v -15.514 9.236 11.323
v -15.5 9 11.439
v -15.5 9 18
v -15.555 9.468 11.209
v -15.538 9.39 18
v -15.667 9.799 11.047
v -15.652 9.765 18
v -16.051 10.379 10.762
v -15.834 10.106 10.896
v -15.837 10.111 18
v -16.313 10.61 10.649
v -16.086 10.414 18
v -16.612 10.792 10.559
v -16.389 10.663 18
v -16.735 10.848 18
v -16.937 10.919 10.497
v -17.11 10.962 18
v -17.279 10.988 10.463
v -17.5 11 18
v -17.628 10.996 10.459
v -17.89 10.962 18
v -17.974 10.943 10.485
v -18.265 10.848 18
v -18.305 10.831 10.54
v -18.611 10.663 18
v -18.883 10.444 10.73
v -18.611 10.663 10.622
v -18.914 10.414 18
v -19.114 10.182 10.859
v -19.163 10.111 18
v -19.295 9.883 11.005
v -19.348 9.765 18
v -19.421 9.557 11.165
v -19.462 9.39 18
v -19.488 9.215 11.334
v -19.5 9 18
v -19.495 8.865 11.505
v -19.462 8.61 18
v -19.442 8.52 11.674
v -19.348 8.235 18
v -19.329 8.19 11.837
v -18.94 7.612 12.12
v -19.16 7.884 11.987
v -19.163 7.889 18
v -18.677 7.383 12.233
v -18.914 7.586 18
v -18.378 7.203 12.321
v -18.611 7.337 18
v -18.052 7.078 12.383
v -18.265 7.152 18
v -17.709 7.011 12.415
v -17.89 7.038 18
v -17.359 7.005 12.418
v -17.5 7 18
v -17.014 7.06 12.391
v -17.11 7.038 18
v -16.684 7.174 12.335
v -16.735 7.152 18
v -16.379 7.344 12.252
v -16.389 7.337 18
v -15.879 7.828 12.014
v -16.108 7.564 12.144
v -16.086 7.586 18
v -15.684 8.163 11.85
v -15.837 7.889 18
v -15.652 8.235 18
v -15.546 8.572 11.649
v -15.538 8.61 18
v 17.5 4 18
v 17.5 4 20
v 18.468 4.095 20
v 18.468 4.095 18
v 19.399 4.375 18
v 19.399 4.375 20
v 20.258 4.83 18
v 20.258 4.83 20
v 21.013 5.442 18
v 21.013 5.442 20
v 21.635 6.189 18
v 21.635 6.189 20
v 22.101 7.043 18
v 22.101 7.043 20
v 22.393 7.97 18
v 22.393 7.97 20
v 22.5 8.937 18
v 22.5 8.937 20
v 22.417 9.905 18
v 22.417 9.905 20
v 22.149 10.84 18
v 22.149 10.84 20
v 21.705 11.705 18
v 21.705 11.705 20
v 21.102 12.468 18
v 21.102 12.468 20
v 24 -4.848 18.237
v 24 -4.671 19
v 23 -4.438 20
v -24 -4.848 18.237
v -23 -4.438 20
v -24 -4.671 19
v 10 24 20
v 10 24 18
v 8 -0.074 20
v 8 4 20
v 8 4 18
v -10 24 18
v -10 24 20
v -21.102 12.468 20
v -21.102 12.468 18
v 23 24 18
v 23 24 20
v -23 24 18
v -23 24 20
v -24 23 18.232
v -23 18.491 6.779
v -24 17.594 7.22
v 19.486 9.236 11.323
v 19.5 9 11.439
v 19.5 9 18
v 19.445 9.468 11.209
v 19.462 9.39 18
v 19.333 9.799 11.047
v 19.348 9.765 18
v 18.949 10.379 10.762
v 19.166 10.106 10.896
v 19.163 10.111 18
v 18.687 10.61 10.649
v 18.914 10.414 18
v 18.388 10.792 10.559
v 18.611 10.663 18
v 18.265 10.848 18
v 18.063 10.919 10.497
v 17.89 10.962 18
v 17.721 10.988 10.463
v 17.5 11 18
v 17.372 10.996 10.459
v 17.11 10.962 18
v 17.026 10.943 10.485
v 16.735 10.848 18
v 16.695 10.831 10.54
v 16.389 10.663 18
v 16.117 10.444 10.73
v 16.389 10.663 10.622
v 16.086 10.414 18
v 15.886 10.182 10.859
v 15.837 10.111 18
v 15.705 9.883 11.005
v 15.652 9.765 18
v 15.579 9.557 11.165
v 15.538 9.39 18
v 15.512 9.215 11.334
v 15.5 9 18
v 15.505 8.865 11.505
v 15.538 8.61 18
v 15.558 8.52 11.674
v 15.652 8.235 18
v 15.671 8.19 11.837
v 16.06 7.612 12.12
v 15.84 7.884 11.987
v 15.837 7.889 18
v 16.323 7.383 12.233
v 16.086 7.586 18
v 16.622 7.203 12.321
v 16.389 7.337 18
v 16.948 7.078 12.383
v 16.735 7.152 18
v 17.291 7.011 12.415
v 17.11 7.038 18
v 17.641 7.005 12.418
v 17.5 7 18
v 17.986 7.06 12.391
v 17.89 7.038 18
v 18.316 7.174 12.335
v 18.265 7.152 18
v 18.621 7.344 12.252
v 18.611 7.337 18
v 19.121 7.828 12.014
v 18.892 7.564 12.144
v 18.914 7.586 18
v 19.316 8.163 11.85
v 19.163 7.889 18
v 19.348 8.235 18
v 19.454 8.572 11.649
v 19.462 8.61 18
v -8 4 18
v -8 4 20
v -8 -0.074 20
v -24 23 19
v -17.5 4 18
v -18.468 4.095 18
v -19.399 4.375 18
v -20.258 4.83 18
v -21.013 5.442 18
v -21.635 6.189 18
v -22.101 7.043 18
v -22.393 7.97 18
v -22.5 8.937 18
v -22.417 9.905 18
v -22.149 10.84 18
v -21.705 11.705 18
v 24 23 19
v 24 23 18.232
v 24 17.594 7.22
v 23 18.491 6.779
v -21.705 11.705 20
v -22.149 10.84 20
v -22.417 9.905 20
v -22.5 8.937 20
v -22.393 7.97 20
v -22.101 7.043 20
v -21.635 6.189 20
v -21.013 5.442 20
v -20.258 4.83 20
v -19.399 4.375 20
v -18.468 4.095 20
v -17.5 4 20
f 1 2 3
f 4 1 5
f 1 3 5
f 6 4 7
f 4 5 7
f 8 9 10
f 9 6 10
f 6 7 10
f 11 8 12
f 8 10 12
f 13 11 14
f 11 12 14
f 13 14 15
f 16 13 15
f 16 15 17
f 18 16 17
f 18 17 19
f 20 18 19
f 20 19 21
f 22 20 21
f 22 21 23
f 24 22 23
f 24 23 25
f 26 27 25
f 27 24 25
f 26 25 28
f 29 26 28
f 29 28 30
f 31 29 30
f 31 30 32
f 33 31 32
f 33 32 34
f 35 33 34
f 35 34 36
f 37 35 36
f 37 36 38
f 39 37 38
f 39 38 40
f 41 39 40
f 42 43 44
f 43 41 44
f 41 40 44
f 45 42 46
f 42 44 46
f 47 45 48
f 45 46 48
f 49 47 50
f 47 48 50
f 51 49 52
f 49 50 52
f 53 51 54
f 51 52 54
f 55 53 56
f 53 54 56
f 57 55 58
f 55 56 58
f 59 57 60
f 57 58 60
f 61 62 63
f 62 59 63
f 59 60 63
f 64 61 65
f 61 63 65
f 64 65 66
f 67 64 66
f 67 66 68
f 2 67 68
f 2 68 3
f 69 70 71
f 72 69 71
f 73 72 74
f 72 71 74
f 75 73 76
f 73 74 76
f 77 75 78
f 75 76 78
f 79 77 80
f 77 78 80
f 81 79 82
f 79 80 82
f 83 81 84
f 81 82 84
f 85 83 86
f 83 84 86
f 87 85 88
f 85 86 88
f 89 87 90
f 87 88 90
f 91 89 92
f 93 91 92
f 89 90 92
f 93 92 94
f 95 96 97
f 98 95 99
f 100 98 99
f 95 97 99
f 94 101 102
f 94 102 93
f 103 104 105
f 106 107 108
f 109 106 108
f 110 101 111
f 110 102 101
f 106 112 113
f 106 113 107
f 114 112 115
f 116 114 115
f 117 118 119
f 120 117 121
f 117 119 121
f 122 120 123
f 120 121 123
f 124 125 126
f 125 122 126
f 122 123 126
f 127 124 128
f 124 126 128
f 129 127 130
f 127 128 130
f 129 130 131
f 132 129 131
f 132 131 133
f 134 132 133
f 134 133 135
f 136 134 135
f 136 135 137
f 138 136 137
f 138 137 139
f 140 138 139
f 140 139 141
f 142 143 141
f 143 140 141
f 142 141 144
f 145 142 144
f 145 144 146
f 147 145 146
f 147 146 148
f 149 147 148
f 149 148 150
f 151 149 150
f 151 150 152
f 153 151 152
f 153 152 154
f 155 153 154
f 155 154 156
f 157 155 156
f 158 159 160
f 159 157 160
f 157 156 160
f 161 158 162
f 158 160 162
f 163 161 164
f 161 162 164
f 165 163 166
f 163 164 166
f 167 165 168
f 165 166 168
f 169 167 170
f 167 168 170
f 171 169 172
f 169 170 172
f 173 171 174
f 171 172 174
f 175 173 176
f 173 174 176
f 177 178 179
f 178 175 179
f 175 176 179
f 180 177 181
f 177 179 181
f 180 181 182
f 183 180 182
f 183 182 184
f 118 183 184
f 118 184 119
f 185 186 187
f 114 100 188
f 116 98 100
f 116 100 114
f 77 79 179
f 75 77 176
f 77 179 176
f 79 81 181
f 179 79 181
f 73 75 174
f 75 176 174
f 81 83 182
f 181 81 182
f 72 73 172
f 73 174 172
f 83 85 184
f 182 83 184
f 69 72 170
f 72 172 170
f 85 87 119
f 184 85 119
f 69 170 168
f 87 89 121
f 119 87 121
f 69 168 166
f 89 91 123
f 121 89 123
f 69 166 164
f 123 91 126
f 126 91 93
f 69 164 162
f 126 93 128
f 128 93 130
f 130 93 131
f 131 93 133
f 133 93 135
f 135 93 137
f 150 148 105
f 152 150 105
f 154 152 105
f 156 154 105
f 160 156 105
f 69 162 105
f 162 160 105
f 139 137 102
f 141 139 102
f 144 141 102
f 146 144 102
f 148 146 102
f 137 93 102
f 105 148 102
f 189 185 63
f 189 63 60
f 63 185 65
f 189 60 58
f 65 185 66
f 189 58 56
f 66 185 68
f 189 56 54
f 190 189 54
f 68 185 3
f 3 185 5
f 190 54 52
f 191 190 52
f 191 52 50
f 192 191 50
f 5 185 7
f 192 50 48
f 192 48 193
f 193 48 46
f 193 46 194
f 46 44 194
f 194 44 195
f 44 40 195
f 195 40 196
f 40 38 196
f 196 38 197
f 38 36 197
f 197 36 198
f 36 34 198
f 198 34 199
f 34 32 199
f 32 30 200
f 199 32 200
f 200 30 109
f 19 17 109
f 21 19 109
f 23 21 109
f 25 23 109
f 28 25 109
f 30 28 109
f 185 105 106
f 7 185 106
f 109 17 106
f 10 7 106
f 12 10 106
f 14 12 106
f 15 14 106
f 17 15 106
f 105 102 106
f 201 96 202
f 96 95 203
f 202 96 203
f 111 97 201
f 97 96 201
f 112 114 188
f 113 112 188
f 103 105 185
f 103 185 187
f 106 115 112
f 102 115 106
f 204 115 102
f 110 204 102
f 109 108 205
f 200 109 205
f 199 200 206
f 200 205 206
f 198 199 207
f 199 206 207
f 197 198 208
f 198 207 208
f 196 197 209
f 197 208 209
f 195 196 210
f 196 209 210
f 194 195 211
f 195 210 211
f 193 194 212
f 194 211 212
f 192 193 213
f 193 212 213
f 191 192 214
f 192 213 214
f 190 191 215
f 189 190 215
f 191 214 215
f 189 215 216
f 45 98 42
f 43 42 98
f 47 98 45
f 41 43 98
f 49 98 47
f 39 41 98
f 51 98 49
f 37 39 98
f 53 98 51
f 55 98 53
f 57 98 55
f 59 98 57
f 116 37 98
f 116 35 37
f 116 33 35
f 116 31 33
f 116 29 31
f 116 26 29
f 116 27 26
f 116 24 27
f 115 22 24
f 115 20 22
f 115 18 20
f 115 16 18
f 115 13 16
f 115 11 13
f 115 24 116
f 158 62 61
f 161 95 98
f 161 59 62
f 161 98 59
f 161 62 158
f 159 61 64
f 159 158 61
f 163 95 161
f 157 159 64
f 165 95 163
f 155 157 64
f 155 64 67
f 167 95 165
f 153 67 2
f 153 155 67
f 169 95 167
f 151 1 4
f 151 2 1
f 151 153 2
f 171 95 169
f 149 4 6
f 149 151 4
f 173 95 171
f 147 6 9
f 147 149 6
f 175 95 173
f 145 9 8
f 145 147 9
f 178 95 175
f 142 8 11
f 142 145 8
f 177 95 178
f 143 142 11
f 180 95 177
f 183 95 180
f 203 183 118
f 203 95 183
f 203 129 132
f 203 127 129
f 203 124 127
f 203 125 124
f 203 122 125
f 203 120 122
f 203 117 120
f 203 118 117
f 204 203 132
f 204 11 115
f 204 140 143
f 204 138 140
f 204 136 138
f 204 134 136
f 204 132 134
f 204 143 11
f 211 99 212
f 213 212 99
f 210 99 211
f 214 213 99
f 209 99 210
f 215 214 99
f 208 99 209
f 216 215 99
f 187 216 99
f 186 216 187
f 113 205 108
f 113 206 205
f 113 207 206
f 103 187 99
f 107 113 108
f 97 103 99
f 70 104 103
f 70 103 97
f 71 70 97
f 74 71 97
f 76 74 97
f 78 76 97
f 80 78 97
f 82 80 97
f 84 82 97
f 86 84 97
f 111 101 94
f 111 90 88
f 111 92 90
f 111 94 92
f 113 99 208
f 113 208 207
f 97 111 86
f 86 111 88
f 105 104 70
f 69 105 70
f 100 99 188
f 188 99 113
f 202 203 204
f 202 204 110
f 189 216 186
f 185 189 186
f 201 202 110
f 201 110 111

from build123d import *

# Parameters (mm, degrees)
SKETCH_W        = 48
SKETCH_H        = 48
PAD_DEPTH       = 20
POCKET_DEPTH    = 2
POCKET001_DEPTH = 48.001
SKETCH003_R     = 2
POCKET002_DEPTH = 11.221735
CHAMFER_SIZE    = 1
CHAMFER001_SIZE = 4
POCKET003_DEPTH = 16


with BuildPart() as part:
    # Sketch → Pad (new body)
    with BuildSketch(Plane.XY):
        Rectangle(SKETCH_W, SKETCH_H)
    extrude(amount=PAD_DEPTH)

    # Sketch001 (on Face6 of Pad) → Pocket (cut)
    with BuildSketch(Plane.XY.offset(20)):
        with BuildLine():
            Line((-10, 24), (10, 24))
            Line((10, 24), (21.102083, 12.467708))
            ThreePointArc((17.5, 4), (22.101008, 7.042775), (21.102083, 12.467708))
            Line((-17.5, 4), (17.5, 4))
            ThreePointArc((-21.102083, 12.467708), (-22.101008, 7.042775), (-17.5, 4))
            Line((-10, 24), (-21.102083, 12.467708))
        make_face()
    extrude(amount=-POCKET_DEPTH, mode=Mode.SUBTRACT)

    # Sketch002 (on Face9 of Pocket) → Pocket001 (cut, through all)
    with BuildSketch(Plane.YZ.offset(24)):
        Polygon((-8.438403, 20), (18.49136, 6.779265), (24, 18), (24, 0), (-24, 0), (-24, 20), align=None)
    extrude(amount=-POCKET001_DEPTH, mode=Mode.SUBTRACT)

    # Sketch003 (on Face8 of Pocket001) → Pocket002 (cut, through all)
    with BuildSketch(Plane.XY.offset(18)):
        with Locations((-17.5, 9)):
            Circle(SKETCH003_R)
        with Locations((17.5, 9)):
            Circle(SKETCH003_R)
    extrude(amount=-POCKET002_DEPTH, mode=Mode.SUBTRACT)

    # Chamfer
    chamfer_edges = [part.edges().sort_by_distance(p)[0] for p in [
        (24, 7.780798, 20),
        (24, 24, 19),
        (24, 21.24568, 12.389633),
        (-24, 21.24568, 12.389633),
        (-24, 24, 19),
        (-24, 7.780798, 20),
    ]]
    chamfer(chamfer_edges, length=CHAMFER_SIZE)

    # Chamfer001
    chamfer001_edges = [part.edges().sort_by_distance(p)[0] for p in [
        (0, -8.438403, 20),
    ]]
    chamfer(chamfer001_edges, length=CHAMFER001_SIZE)

    # Sketch004 (on Face7 of Chamfer001) → Pocket003 (cut)
    with BuildSketch(Plane.YZ.offset(8)):
        Polygon((4, 18), (-0.073868, 20), (4, 20), align=None)
    extrude(amount=-POCKET003_DEPTH, mode=Mode.SUBTRACT)


solid = part.part
